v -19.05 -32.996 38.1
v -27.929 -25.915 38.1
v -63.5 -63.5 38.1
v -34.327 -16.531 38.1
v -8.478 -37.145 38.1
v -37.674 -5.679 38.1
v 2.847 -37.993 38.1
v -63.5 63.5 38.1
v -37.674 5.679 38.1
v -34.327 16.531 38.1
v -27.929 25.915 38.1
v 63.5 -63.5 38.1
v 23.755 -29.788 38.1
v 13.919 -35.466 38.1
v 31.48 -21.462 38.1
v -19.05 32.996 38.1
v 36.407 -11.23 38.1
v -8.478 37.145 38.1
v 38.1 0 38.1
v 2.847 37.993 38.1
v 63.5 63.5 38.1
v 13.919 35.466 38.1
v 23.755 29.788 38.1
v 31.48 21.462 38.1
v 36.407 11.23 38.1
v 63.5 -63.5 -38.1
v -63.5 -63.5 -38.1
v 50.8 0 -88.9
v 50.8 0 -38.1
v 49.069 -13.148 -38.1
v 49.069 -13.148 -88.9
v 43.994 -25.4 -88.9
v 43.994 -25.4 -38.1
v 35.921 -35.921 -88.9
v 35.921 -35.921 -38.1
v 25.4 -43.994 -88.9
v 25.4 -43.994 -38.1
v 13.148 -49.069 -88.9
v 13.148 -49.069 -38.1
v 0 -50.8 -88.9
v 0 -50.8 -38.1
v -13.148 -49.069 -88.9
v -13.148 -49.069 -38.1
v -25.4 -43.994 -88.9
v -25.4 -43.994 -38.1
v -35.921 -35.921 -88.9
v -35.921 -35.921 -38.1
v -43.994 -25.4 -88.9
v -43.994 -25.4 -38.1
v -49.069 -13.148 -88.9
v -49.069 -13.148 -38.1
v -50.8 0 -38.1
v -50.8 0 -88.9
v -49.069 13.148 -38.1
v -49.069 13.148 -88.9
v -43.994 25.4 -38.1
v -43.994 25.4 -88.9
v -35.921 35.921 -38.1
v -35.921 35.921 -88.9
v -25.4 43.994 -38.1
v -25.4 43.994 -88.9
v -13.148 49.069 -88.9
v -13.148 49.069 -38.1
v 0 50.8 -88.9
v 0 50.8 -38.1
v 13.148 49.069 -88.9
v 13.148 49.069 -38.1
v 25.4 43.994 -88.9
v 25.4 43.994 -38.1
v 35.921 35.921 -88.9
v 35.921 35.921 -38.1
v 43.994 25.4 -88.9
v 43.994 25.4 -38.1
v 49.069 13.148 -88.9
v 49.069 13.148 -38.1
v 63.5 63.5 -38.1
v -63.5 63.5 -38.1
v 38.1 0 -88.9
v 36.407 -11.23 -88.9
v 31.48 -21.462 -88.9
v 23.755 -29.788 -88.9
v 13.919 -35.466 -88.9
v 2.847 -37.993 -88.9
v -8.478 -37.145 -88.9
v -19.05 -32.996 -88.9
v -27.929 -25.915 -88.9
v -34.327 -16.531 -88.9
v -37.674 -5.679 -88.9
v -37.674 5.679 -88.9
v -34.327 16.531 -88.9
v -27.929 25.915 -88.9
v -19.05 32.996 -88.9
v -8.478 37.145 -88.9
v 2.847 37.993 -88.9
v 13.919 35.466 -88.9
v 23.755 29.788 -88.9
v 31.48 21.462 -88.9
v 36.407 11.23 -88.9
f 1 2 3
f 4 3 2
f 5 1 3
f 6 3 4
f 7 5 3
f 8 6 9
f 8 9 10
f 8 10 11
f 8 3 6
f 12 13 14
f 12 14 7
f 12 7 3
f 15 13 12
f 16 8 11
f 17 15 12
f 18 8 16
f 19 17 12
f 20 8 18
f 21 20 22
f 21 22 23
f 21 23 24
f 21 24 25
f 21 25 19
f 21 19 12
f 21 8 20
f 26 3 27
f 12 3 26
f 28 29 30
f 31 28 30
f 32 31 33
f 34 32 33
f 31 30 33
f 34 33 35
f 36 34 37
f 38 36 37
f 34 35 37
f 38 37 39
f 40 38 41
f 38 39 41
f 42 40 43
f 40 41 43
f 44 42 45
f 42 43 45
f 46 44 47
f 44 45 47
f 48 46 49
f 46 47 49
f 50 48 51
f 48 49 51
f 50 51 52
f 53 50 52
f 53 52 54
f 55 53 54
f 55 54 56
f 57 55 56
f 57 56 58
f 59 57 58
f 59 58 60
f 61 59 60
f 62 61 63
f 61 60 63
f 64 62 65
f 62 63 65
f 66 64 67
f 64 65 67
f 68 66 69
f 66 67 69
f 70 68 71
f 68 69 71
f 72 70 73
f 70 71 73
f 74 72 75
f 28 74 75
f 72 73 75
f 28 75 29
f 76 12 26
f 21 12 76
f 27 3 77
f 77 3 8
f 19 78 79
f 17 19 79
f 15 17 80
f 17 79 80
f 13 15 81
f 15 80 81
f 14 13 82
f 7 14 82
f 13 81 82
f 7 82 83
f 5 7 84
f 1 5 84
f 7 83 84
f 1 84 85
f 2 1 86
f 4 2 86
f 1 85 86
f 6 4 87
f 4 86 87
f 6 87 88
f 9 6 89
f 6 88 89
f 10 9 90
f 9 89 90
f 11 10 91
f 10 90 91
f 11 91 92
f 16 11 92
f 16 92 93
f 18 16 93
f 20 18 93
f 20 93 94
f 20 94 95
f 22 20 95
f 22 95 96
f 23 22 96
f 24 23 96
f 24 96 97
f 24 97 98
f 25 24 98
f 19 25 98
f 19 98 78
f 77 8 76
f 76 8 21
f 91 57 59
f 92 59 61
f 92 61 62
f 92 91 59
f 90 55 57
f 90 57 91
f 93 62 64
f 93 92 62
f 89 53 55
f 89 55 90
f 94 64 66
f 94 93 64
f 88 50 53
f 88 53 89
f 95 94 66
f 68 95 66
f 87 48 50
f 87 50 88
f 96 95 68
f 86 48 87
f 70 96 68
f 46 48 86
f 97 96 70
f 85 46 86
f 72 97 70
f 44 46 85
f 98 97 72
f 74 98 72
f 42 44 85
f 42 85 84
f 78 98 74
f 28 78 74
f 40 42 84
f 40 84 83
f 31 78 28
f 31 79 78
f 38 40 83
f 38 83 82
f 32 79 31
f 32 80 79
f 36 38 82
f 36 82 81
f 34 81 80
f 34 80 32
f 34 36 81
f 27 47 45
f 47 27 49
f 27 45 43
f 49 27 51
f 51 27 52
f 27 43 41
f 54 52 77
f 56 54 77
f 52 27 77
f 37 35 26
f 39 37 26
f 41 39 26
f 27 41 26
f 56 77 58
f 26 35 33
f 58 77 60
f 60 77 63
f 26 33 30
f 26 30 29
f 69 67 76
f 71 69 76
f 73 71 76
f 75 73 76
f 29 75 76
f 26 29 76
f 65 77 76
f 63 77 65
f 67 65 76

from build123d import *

# Parameters (mm, degrees)
F0_W     = 127
F0_H     = 127
F1_DEPTH = 38.1
F2_R     = 50.8
F3_DEPTH = 50.8
F4_R     = 38.1
F5_DEPTH = 127.001


with BuildPart() as f1:
    # F0 (on Top) → F1 (new body, symmetric)
    with BuildSketch(Plane.XY):
        Rectangle(F0_W, F0_H)
    extrude(amount=F1_DEPTH, both=True)

    # F2 (on face) → F3 (join)
    with BuildSketch(Plane(origin=(0, 0, -38.1), x_dir=(1, 0, 0), z_dir=(0, 0, -1))):
        Circle(F2_R)
    extrude(amount=F3_DEPTH)

    # F4 (on face) → F5 (cut, through all)
    with BuildSketch(Plane(origin=(0, 0, -88.9), x_dir=(1, 0, 0), z_dir=(0, 0, -1))):
        Circle(F4_R)
    extrude(amount=-F5_DEPTH, mode=Mode.SUBTRACT)


solid = f1.part
